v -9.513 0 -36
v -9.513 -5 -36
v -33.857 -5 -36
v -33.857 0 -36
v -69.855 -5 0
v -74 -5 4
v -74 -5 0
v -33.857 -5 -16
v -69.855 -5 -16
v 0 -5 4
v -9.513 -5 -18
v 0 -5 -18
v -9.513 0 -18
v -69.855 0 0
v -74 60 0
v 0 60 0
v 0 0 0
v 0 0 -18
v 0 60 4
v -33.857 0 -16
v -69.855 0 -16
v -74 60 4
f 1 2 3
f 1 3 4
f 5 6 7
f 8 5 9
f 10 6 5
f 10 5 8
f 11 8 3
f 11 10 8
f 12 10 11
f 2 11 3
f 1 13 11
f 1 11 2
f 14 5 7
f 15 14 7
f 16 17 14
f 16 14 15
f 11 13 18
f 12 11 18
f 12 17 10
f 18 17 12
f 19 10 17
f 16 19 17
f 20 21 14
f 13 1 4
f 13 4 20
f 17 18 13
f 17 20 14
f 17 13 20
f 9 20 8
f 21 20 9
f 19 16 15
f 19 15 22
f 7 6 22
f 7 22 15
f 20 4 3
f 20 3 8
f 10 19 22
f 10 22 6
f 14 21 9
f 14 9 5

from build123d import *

# Parameters (mm, degrees)
EXTRUDE_1_DEPTH     = 74
SKETCH_2_W          = 9.512991355
SKETCH_2_H          = 18
CUT_EXTRUDE_1_DEPTH = 102.843016452


with BuildPart() as part:
    # Эскиз1 → Вытянуть1 (new body)
    with BuildSketch(Plane(origin=(0, 0, 0), x_dir=(0, 0, -1), z_dir=(1, 0, 0))):
        Polygon((0, 0), (0, 60), (-4, 60), (-4, -5), (36, -5), (36, 0), align=None)
    extrude(amount=-EXTRUDE_1_DEPTH)

    # Эскиз2 → Вырез-Вытянуть1 (cut, through all)
    with BuildSketch(Plane(origin=(0, 0, 0), x_dir=(1, 0, 0), z_dir=(0, 1, 0))):
        Polygon((-33.857381994, 16), (-69.85538749, 16), (-69.85538749, 0), (-75.857381994, 0), (-75.857381994, 39.592922538), (-33.857381994, 39.592922538), align=None)
        with Locations((-4.756495678, 27)):
            Rectangle(SKETCH_2_W, SKETCH_2_H)
    extrude(amount=-CUT_EXTRUDE_1_DEPTH, mode=Mode.SUBTRACT)


solid = part.part
